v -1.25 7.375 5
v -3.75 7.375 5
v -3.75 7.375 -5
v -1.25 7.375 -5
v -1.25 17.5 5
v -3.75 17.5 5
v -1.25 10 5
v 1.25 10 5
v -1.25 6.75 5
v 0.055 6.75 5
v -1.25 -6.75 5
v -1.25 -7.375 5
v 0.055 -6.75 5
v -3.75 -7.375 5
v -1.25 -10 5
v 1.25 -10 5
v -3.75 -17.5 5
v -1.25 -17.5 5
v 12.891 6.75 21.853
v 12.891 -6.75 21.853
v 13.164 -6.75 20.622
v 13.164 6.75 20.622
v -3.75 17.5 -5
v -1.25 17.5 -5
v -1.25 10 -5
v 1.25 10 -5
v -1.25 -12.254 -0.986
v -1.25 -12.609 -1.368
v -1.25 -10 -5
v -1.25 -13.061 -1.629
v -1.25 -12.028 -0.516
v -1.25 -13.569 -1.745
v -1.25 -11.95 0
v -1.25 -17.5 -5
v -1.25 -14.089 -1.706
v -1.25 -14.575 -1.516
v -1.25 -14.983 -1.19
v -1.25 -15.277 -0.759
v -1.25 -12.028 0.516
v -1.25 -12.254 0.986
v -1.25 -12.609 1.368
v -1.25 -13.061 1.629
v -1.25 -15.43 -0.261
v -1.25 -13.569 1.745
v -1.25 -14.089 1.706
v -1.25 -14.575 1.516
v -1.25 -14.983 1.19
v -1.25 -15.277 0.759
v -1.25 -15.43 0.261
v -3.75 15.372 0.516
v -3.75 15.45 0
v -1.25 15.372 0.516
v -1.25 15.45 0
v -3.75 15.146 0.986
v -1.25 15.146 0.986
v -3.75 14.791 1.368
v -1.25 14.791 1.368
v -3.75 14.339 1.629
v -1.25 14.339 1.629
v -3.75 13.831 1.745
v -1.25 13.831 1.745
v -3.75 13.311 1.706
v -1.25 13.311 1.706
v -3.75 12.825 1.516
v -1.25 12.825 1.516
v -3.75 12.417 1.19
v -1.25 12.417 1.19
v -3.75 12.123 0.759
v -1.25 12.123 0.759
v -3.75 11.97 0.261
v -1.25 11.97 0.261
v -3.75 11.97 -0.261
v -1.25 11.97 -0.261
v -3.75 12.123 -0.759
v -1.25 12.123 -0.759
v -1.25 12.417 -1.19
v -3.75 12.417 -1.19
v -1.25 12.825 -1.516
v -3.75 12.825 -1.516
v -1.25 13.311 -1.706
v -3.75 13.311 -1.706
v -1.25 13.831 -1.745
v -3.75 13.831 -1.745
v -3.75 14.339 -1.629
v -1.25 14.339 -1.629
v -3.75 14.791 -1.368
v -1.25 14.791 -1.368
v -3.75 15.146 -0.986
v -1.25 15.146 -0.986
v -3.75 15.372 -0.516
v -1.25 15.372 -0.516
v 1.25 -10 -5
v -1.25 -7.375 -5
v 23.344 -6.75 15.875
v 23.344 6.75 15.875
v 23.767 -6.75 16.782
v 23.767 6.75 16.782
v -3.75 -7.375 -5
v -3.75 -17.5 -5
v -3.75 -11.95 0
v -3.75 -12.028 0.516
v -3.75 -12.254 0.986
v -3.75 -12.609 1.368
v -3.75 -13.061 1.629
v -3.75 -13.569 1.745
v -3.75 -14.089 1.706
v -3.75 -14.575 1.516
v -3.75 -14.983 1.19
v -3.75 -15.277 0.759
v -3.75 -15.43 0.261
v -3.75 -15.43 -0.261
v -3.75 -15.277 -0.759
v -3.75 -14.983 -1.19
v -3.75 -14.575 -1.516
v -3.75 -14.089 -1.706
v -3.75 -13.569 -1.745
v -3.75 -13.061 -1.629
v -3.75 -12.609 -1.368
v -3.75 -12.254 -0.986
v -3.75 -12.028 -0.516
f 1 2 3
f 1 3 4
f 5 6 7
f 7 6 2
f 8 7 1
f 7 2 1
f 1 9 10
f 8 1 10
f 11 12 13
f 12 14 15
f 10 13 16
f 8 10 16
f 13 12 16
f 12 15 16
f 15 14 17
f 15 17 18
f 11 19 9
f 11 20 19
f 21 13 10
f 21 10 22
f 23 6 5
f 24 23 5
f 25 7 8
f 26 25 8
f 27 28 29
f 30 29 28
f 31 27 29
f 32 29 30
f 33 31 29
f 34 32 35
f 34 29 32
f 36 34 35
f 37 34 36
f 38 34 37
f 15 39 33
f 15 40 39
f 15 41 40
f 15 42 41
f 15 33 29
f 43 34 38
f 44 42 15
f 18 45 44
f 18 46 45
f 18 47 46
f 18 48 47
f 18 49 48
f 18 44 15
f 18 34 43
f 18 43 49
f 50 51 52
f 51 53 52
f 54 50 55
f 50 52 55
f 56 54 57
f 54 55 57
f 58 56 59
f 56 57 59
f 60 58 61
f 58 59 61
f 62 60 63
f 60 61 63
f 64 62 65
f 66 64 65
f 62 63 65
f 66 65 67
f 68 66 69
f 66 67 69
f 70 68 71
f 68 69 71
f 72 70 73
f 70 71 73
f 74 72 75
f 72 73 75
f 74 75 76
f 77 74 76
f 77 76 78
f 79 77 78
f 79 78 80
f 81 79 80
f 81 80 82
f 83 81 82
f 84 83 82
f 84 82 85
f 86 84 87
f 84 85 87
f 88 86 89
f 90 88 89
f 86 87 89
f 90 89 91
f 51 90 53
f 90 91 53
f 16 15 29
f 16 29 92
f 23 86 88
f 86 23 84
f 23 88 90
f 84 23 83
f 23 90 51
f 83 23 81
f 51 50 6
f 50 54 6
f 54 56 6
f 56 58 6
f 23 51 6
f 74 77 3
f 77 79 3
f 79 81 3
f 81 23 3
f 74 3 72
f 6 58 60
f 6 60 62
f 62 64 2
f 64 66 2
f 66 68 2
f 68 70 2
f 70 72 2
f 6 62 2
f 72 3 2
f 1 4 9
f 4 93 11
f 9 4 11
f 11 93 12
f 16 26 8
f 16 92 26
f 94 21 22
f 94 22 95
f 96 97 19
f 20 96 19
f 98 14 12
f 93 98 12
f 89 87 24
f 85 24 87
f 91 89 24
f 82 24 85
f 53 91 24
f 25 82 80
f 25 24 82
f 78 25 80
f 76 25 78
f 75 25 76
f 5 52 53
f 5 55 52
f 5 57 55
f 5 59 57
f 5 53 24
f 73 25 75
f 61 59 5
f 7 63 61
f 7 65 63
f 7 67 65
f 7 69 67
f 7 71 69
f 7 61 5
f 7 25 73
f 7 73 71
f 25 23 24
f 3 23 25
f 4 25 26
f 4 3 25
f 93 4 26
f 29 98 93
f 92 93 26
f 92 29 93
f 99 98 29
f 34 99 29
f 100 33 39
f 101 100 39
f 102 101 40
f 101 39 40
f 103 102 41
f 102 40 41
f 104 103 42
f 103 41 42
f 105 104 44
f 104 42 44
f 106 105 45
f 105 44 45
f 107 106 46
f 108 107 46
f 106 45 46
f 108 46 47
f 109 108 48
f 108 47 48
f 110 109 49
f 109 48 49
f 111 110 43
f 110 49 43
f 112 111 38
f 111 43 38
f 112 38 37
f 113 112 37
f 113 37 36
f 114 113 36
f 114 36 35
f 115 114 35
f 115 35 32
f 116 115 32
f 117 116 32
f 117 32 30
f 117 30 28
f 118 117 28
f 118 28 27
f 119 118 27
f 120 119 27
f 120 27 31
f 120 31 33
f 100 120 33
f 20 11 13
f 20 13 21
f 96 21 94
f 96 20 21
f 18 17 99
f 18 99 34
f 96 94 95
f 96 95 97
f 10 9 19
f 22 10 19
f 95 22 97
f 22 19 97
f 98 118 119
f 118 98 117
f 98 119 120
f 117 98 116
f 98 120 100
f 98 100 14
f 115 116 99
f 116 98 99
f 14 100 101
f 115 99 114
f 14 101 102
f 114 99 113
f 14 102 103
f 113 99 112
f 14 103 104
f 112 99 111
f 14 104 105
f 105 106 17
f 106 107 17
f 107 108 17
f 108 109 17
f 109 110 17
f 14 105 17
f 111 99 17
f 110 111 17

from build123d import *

# Parameters (mm, degrees)
F1_DEPTH = 10
F2_DEPTH = 6.75
F0_W     = 2.5
F0_H     = 10
F3_DEPTH = 17.5
F4_DEPTH = 7.375
F5_R     = 1.75
F6_DEPTH = 5


with BuildPart() as f1:
    # F0 (on Front) → F1 (new body, symmetric)
    with BuildSketch(Plane.XZ):
        Polygon((1.25, -5), (1.25, 5), (0.055407, 5), (-1.25, 5), (-1.25, -5), align=None)
    extrude(amount=F1_DEPTH, both=True)

    # F0 (on Front) → F2 (join, symmetric)
    with BuildSketch(Plane.XZ):
        Polygon((-1.25, 5), (0.055407, 5), (13.164144, 20.622384), (23.344403, 15.875251), (23.767021, 16.781559), (12.891327, 21.852978), align=None)
    extrude(amount=F2_DEPTH, both=True)

    # F0 (on Front) → F3 (join, symmetric)
    with BuildSketch(Plane.XZ):
        with Locations((-2.5, 0)):
            Rectangle(F0_W, F0_H)
    extrude(amount=F3_DEPTH, both=True)

    # F0 (on Front) → F4 (cut, symmetric)
    with BuildSketch(Plane.XZ):
        with Locations((-2.5, 0)):
            Rectangle(F0_W, F0_H)
    extrude(amount=F4_DEPTH, both=True, mode=Mode.SUBTRACT)

    # F5 (on Right) → F6 (cut, symmetric)
    with BuildSketch(Plane.YZ):
        with Locations((-13.7, 0)):
            Circle(F5_R)
        with Locations((13.7, 0)):
            Circle(F5_R)
    extrude(amount=F6_DEPTH, both=True, mode=Mode.SUBTRACT)


solid = f1.part
